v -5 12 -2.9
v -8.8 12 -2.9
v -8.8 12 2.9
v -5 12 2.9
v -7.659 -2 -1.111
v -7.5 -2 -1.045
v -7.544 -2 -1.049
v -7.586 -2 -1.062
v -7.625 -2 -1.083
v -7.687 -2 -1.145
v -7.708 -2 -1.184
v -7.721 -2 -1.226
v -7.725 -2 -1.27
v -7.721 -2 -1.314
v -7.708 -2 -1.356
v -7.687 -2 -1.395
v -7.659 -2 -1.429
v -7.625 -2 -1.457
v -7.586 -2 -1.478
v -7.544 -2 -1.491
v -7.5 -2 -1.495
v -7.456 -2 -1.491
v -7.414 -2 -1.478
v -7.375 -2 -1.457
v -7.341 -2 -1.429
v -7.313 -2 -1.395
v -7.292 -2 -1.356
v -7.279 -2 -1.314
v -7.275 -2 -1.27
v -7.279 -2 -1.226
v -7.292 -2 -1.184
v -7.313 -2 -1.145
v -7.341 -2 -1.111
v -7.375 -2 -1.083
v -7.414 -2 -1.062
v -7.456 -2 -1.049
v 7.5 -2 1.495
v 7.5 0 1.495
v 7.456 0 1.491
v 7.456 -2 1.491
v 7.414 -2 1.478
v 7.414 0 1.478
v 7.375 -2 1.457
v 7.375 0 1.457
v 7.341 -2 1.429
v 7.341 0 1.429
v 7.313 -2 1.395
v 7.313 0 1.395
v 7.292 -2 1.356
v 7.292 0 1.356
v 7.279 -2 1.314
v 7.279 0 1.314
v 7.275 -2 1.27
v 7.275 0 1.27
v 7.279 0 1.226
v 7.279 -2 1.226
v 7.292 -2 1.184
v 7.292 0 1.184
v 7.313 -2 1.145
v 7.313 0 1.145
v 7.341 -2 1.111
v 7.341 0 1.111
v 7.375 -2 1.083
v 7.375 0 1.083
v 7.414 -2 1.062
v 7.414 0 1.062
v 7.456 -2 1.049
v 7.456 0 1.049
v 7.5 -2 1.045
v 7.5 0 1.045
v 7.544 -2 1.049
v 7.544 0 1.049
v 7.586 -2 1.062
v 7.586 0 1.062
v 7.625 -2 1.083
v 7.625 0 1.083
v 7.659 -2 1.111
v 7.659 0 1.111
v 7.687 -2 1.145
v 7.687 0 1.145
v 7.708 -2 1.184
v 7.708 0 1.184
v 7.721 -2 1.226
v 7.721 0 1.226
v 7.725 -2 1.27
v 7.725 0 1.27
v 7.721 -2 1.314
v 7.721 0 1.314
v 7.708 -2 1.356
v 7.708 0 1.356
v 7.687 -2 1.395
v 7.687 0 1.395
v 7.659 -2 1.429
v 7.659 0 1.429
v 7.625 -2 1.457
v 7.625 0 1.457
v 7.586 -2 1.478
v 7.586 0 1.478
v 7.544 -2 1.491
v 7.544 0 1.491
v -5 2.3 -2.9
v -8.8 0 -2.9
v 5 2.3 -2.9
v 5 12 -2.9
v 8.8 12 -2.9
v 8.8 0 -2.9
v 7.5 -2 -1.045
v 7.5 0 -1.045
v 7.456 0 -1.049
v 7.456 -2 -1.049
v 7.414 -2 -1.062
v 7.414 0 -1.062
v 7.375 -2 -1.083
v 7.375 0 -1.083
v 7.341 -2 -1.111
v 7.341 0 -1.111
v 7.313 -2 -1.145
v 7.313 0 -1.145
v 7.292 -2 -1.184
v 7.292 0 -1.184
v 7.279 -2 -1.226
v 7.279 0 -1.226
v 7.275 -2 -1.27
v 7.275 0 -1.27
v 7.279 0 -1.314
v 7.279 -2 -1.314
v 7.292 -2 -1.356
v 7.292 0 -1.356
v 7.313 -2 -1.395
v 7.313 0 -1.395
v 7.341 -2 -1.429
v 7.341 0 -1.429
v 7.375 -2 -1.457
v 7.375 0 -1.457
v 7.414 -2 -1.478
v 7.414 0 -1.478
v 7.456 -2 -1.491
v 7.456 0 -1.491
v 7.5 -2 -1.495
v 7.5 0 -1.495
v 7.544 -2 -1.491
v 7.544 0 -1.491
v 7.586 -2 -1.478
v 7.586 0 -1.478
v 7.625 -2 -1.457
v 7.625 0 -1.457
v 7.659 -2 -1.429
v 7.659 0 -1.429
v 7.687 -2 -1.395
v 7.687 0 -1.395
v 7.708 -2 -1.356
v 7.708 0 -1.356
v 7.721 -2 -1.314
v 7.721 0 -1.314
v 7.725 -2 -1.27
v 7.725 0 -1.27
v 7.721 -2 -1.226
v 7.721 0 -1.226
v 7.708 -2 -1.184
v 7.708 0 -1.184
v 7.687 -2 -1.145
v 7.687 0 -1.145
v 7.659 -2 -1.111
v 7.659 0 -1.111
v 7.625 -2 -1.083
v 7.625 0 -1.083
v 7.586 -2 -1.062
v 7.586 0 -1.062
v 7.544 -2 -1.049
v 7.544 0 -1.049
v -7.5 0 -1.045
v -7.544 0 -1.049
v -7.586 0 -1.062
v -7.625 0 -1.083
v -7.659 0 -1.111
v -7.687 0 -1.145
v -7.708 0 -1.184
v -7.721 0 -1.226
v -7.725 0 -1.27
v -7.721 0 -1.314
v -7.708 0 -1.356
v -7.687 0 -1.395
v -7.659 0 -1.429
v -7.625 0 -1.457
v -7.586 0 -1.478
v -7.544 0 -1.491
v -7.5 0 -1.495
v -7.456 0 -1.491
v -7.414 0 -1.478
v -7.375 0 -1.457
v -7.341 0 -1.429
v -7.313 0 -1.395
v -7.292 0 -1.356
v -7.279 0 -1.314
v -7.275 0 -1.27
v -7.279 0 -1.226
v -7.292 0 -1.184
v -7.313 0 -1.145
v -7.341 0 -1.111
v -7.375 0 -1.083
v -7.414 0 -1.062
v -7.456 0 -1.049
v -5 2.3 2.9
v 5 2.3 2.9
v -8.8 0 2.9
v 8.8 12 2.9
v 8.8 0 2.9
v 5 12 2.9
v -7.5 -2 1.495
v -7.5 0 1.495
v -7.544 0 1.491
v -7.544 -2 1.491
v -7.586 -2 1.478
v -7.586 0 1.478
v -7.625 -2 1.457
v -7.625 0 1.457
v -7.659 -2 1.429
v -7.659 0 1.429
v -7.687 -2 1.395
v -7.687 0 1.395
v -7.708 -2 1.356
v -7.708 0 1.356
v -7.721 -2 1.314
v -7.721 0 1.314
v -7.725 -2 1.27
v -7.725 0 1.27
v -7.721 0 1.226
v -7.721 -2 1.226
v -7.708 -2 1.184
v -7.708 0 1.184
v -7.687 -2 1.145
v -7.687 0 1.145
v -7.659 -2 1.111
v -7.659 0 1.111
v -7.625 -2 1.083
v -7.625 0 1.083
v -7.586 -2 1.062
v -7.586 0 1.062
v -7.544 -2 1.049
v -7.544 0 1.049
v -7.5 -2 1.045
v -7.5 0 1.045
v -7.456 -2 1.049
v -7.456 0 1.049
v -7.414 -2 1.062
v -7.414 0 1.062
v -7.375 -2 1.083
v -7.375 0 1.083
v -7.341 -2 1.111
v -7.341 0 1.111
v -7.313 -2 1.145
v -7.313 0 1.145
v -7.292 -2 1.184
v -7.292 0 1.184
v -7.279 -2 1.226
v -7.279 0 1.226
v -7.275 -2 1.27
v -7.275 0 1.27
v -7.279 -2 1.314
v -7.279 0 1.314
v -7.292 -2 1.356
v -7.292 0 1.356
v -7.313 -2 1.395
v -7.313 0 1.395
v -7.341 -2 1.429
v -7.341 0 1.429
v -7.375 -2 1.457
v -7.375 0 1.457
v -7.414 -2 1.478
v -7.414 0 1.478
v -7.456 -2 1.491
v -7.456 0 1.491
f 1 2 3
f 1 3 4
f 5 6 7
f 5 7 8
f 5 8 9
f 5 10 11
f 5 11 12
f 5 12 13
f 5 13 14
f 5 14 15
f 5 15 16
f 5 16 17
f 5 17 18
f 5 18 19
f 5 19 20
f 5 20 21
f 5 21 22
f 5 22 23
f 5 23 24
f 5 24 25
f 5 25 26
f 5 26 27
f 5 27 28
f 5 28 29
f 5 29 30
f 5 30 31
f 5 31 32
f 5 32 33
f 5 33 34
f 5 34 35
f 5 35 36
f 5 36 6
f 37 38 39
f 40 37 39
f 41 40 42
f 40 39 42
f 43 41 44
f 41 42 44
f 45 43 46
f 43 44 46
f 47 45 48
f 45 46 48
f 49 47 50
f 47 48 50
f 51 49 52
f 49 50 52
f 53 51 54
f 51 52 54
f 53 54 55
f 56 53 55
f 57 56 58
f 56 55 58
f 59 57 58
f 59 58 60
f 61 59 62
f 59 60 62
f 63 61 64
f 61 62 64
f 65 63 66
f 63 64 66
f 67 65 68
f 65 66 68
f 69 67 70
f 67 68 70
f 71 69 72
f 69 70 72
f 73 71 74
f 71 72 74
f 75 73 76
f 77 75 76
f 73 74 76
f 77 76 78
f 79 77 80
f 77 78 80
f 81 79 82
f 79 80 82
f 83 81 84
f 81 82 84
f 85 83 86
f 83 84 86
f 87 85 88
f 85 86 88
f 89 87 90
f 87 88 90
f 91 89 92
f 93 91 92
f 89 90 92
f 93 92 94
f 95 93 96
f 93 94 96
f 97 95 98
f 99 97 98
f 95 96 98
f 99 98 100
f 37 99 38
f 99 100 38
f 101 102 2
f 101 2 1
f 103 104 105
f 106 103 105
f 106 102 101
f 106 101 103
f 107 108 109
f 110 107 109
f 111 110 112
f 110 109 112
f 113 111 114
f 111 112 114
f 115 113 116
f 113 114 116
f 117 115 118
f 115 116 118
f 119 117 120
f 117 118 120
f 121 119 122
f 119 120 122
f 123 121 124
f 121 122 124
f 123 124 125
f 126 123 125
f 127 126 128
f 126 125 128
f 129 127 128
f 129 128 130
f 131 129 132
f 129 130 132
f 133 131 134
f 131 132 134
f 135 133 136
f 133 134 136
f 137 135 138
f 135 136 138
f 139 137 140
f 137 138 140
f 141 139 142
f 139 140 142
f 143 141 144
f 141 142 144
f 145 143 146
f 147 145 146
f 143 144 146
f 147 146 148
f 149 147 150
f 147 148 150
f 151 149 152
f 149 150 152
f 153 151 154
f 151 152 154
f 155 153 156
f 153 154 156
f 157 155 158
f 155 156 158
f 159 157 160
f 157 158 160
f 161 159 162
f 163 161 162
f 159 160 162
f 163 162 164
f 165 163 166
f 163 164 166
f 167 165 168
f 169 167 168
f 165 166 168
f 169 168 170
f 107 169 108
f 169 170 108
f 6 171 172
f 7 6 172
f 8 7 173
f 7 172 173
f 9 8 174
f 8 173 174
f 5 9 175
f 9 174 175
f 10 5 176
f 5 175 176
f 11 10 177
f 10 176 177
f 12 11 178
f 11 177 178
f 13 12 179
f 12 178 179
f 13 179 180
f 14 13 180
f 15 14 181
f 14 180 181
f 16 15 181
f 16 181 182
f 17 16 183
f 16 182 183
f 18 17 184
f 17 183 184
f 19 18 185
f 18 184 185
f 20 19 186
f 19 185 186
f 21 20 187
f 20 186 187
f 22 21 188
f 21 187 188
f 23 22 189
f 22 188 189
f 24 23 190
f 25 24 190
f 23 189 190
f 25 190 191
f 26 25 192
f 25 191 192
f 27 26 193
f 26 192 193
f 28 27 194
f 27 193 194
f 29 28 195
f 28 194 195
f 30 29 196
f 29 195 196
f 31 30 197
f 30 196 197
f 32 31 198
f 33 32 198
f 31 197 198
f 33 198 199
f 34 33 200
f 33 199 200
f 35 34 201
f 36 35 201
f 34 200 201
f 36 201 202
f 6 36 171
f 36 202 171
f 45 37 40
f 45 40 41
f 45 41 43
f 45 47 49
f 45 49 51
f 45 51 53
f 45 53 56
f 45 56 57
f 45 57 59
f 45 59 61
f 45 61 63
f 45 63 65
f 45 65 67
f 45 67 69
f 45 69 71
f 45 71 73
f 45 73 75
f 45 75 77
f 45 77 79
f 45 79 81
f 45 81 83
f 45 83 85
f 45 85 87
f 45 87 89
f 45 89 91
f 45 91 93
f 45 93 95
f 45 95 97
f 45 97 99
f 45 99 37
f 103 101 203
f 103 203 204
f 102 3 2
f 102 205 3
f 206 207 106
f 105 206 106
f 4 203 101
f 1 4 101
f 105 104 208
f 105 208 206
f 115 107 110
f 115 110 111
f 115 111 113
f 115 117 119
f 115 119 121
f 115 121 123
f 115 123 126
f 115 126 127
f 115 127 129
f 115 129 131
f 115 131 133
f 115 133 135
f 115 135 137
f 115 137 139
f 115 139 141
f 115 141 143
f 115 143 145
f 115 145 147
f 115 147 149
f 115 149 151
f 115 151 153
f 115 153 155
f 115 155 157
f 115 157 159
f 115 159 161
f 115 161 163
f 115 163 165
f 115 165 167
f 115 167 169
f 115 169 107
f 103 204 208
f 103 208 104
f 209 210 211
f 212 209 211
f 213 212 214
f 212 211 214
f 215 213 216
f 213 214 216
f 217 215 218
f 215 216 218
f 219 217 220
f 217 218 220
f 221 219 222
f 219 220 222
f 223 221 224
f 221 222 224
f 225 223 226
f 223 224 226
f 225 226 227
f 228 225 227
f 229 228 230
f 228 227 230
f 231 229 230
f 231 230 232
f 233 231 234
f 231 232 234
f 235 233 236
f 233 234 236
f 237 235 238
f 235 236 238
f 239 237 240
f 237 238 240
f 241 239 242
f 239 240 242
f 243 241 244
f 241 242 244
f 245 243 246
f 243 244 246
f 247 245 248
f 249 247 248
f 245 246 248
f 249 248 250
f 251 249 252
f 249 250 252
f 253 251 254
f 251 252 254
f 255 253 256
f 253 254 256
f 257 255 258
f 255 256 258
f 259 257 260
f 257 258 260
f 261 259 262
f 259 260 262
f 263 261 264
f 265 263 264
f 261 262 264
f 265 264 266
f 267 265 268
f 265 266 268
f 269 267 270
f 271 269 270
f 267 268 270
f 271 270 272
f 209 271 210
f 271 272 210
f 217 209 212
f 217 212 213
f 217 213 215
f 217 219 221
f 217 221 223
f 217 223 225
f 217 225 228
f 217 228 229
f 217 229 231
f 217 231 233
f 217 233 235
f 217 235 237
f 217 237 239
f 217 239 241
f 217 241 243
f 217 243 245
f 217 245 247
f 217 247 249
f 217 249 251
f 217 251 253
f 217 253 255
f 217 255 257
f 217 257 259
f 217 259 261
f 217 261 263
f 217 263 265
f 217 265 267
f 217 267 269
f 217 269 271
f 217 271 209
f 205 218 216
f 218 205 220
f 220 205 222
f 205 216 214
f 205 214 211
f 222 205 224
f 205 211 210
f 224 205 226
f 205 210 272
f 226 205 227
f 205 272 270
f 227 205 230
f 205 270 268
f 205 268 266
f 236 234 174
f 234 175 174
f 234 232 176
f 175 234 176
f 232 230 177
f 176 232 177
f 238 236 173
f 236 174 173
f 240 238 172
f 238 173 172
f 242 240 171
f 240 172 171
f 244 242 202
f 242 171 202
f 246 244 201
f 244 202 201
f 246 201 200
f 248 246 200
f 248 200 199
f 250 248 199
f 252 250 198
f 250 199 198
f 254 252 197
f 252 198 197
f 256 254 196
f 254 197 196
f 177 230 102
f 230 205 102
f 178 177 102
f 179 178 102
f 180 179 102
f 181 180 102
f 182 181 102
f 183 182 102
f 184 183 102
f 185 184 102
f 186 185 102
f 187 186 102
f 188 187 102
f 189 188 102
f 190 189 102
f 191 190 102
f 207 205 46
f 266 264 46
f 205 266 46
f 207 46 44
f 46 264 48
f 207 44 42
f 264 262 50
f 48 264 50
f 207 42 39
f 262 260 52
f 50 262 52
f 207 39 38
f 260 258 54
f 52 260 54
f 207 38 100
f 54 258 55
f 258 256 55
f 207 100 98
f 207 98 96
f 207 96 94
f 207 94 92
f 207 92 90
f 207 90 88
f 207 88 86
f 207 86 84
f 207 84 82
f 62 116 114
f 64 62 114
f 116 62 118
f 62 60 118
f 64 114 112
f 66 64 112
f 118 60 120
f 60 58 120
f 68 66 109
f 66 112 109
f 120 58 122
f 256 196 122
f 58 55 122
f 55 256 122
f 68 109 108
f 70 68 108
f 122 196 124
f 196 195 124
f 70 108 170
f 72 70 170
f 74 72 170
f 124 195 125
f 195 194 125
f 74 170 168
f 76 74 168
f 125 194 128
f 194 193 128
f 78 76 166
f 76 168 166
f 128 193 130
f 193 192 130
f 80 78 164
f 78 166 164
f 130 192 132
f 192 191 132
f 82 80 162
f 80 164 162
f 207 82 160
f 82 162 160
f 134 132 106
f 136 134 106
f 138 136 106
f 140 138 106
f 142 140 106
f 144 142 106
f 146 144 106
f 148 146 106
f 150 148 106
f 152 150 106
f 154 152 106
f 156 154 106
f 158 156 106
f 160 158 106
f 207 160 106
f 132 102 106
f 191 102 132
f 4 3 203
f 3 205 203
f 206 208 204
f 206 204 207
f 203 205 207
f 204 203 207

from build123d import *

# Parameters (mm, degrees)
SKETCH_1_W      = 17.6
SKETCH_1_H      = 5.8
EXTRUDE_1_DEPTH = 2.3
SKETCH_2_W      = 3.8
SKETCH_2_H      = 5.8
EXTRUDE_2_DEPTH = 9.7
SKETCH_5_R      = 0.225
EXTRUDE_3_DEPTH = 2


with BuildPart() as part:
    # 草图1 → 凸台-拉伸1 (new body)
    with BuildSketch(Plane(origin=(0, 0, 0), x_dir=(1, 0, 0), z_dir=(0, 1, 0))):
        Rectangle(SKETCH_1_W, SKETCH_1_H)
    extrude(amount=EXTRUDE_1_DEPTH)

    # 草图2 → 凸台-拉伸2 (add)
    with BuildSketch(Plane(origin=(0, 2.3, 0), x_dir=(1, 0, 0), z_dir=(0, 1, 0))):
        with Locations((-6.9, 0)):
            Rectangle(SKETCH_2_W, SKETCH_2_H)
        with Locations((6.9, 0)):
            Rectangle(SKETCH_2_W, SKETCH_2_H)
    extrude(amount=EXTRUDE_2_DEPTH)

    # 草图5 → 凸台-拉伸3 (add)
    with BuildSketch(Plane.XZ):
        with Locations(Location((-7.5, 1.27, 0), (0, 0, 90))):
            Circle(SKETCH_5_R)
        with Locations(Location((-7.5, -1.27, 0), (0, 0, 90))):
            Circle(SKETCH_5_R)
        with Locations(Location((7.5, 1.27, 0), (0, 0, 90))):
            Circle(SKETCH_5_R)
        with Locations(Location((7.5, -1.27, 0), (0, 0, 90))):
            Circle(SKETCH_5_R)
    extrude(amount=EXTRUDE_3_DEPTH)


solid = part.part
